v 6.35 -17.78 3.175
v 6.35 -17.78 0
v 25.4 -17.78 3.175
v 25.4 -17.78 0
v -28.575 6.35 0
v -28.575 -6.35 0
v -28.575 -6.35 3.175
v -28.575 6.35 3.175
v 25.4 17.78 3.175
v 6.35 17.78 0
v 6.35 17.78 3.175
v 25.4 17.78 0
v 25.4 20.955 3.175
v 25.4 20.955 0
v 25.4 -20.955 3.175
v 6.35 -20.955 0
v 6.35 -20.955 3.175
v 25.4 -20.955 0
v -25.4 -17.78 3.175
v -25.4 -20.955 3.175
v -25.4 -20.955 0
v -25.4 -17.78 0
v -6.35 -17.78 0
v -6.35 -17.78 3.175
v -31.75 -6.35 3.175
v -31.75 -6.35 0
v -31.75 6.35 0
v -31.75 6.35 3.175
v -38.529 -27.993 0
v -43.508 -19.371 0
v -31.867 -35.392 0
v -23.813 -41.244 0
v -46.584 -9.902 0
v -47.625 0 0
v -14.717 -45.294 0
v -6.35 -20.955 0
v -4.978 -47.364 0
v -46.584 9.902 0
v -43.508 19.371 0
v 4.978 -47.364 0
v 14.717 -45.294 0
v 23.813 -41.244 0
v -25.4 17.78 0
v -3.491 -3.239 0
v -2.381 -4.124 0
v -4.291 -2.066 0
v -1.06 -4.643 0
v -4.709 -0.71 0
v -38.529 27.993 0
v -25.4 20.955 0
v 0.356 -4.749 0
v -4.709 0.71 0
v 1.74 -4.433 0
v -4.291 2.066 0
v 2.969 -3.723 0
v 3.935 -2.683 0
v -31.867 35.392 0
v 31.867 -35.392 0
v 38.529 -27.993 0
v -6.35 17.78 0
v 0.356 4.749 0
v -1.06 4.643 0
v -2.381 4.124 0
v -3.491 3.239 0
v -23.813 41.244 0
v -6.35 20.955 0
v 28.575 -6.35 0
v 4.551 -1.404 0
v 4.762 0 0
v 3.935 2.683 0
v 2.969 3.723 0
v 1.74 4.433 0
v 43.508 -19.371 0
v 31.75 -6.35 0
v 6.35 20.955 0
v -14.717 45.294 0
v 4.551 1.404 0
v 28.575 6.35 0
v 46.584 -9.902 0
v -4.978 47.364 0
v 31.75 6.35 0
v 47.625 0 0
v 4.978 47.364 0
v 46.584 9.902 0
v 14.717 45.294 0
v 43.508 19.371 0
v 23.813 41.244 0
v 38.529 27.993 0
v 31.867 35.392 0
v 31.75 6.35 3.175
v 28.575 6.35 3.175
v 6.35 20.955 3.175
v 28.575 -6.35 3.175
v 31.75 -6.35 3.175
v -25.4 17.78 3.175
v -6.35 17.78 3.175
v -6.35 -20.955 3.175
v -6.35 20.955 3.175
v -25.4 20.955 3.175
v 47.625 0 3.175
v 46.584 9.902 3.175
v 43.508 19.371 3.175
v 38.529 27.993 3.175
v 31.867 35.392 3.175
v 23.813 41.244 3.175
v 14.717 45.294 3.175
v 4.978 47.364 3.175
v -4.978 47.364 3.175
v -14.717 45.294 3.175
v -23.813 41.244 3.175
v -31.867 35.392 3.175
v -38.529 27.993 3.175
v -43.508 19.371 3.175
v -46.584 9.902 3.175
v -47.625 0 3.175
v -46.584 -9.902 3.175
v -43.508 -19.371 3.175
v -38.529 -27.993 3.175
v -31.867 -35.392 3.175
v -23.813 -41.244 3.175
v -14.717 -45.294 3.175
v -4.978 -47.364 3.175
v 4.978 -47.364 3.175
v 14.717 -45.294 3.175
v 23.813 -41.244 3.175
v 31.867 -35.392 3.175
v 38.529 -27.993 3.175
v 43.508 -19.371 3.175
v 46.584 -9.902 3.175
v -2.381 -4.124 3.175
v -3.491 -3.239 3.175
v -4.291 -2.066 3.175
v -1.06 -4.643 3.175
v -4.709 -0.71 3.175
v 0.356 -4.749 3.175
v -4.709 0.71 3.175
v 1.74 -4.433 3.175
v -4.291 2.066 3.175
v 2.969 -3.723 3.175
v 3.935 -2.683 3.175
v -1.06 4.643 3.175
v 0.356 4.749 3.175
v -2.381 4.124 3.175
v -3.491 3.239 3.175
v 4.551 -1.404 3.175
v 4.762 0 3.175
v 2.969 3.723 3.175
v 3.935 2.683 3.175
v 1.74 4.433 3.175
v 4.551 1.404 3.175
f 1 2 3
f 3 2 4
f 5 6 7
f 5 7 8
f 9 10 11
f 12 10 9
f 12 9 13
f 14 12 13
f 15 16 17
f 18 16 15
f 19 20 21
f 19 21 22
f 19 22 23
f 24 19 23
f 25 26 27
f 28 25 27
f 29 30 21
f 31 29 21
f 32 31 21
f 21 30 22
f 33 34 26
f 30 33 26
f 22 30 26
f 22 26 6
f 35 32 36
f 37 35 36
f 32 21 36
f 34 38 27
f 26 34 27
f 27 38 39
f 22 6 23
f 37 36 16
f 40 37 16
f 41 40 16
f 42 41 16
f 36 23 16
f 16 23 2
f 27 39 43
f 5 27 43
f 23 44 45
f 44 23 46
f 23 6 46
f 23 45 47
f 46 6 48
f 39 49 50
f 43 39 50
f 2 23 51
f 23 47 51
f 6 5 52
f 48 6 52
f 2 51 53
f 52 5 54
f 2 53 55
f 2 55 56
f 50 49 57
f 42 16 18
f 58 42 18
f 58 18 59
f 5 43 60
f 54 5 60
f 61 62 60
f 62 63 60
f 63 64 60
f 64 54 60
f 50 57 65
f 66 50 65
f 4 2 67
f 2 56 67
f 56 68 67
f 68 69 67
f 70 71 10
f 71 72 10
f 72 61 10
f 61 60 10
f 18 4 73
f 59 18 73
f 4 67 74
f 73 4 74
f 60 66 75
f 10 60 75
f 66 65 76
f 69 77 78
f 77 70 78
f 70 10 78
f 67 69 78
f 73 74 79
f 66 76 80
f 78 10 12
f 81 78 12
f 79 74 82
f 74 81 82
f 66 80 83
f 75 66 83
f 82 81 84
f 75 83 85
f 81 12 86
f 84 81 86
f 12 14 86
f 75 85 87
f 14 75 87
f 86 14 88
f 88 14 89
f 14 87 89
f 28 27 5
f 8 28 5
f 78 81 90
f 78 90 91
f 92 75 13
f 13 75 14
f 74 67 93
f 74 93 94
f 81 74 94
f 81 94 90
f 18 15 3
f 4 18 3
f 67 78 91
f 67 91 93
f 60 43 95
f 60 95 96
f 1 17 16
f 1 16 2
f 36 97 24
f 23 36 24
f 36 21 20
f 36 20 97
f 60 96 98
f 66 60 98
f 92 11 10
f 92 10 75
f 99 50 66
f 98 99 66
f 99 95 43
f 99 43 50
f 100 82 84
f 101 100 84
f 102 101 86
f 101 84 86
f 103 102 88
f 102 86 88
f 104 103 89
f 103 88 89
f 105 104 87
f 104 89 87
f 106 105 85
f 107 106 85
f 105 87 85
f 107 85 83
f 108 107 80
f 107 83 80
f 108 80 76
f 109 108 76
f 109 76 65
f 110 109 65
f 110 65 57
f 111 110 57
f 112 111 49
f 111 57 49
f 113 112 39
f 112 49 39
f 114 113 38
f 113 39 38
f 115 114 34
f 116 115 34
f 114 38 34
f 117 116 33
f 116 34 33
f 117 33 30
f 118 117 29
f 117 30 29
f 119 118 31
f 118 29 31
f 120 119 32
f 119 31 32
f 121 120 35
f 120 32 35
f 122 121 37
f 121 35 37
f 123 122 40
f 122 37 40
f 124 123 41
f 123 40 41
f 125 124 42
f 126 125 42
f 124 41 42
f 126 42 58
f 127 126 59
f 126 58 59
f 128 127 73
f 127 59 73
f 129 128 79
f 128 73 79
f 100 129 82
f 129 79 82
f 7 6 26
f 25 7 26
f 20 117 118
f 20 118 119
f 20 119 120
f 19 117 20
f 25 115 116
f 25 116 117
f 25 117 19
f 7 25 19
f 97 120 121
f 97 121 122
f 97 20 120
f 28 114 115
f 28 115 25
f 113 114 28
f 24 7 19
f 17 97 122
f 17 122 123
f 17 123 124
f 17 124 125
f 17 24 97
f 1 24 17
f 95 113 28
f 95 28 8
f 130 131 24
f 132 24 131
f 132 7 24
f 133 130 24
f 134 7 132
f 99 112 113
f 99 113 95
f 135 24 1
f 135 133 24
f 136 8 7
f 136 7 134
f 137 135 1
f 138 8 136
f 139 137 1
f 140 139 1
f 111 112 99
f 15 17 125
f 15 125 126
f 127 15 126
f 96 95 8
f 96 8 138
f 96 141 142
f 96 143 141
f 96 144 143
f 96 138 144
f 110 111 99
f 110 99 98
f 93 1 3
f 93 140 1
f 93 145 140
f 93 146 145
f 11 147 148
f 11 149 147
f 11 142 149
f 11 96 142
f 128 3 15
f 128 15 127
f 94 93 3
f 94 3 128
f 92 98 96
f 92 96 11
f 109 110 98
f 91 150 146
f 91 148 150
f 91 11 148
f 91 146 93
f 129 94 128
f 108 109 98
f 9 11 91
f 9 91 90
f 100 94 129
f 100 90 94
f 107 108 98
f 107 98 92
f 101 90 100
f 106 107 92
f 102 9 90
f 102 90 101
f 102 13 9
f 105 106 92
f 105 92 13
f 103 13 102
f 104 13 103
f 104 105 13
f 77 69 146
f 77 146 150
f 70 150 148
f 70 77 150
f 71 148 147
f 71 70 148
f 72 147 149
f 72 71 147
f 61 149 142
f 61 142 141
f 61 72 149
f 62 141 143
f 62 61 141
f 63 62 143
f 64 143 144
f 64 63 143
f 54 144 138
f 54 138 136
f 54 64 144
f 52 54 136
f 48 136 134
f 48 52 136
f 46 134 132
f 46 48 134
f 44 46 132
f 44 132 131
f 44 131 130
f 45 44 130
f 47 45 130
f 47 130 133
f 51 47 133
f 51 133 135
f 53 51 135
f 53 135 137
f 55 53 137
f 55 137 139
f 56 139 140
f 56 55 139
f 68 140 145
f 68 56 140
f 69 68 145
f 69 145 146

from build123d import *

# Parameters (mm, degrees)
SKETCH1_R           = 47.625
SKETCH1_R_2         = 4.7625
BOSS_EXTRUDE1_DEPTH = 3.175
SKETCH3_W           = 19.05
SKETCH3_H           = 3.175
CUT_EXTRUDE2_DEPTH  = 3.175


with BuildPart() as part:
    # Sketch1 → Boss-Extrude1 (new body)
    with BuildSketch(Plane.XY):
        Circle(SKETCH1_R)
        Circle(SKETCH1_R_2, mode=Mode.SUBTRACT)
    extrude(amount=BOSS_EXTRUDE1_DEPTH)

    # Sketch3 → Cut-Extrude2 (cut)
    with BuildSketch(Plane.XY):
        Polygon((-28.575, 0), (-28.575, -6.35), (-31.75, -6.35), (-31.75, 6.35), (-28.575, 6.35), align=None)
        Polygon((31.75, 0), (31.75, 6.35), (28.575, 6.35), (28.575, -6.35), (31.75, -6.35), align=None)
        with Locations((15.875, 19.3675)):
            Rectangle(SKETCH3_W, SKETCH3_H)
        with Locations((-15.875, 19.3675)):
            Rectangle(SKETCH3_W, SKETCH3_H)
        with Locations((-15.875, -19.3675)):
            Rectangle(SKETCH3_W, SKETCH3_H)
        with Locations((15.875, -19.3675)):
            Rectangle(SKETCH3_W, SKETCH3_H)
    extrude(amount=CUT_EXTRUDE2_DEPTH, mode=Mode.SUBTRACT)


solid = part.part
